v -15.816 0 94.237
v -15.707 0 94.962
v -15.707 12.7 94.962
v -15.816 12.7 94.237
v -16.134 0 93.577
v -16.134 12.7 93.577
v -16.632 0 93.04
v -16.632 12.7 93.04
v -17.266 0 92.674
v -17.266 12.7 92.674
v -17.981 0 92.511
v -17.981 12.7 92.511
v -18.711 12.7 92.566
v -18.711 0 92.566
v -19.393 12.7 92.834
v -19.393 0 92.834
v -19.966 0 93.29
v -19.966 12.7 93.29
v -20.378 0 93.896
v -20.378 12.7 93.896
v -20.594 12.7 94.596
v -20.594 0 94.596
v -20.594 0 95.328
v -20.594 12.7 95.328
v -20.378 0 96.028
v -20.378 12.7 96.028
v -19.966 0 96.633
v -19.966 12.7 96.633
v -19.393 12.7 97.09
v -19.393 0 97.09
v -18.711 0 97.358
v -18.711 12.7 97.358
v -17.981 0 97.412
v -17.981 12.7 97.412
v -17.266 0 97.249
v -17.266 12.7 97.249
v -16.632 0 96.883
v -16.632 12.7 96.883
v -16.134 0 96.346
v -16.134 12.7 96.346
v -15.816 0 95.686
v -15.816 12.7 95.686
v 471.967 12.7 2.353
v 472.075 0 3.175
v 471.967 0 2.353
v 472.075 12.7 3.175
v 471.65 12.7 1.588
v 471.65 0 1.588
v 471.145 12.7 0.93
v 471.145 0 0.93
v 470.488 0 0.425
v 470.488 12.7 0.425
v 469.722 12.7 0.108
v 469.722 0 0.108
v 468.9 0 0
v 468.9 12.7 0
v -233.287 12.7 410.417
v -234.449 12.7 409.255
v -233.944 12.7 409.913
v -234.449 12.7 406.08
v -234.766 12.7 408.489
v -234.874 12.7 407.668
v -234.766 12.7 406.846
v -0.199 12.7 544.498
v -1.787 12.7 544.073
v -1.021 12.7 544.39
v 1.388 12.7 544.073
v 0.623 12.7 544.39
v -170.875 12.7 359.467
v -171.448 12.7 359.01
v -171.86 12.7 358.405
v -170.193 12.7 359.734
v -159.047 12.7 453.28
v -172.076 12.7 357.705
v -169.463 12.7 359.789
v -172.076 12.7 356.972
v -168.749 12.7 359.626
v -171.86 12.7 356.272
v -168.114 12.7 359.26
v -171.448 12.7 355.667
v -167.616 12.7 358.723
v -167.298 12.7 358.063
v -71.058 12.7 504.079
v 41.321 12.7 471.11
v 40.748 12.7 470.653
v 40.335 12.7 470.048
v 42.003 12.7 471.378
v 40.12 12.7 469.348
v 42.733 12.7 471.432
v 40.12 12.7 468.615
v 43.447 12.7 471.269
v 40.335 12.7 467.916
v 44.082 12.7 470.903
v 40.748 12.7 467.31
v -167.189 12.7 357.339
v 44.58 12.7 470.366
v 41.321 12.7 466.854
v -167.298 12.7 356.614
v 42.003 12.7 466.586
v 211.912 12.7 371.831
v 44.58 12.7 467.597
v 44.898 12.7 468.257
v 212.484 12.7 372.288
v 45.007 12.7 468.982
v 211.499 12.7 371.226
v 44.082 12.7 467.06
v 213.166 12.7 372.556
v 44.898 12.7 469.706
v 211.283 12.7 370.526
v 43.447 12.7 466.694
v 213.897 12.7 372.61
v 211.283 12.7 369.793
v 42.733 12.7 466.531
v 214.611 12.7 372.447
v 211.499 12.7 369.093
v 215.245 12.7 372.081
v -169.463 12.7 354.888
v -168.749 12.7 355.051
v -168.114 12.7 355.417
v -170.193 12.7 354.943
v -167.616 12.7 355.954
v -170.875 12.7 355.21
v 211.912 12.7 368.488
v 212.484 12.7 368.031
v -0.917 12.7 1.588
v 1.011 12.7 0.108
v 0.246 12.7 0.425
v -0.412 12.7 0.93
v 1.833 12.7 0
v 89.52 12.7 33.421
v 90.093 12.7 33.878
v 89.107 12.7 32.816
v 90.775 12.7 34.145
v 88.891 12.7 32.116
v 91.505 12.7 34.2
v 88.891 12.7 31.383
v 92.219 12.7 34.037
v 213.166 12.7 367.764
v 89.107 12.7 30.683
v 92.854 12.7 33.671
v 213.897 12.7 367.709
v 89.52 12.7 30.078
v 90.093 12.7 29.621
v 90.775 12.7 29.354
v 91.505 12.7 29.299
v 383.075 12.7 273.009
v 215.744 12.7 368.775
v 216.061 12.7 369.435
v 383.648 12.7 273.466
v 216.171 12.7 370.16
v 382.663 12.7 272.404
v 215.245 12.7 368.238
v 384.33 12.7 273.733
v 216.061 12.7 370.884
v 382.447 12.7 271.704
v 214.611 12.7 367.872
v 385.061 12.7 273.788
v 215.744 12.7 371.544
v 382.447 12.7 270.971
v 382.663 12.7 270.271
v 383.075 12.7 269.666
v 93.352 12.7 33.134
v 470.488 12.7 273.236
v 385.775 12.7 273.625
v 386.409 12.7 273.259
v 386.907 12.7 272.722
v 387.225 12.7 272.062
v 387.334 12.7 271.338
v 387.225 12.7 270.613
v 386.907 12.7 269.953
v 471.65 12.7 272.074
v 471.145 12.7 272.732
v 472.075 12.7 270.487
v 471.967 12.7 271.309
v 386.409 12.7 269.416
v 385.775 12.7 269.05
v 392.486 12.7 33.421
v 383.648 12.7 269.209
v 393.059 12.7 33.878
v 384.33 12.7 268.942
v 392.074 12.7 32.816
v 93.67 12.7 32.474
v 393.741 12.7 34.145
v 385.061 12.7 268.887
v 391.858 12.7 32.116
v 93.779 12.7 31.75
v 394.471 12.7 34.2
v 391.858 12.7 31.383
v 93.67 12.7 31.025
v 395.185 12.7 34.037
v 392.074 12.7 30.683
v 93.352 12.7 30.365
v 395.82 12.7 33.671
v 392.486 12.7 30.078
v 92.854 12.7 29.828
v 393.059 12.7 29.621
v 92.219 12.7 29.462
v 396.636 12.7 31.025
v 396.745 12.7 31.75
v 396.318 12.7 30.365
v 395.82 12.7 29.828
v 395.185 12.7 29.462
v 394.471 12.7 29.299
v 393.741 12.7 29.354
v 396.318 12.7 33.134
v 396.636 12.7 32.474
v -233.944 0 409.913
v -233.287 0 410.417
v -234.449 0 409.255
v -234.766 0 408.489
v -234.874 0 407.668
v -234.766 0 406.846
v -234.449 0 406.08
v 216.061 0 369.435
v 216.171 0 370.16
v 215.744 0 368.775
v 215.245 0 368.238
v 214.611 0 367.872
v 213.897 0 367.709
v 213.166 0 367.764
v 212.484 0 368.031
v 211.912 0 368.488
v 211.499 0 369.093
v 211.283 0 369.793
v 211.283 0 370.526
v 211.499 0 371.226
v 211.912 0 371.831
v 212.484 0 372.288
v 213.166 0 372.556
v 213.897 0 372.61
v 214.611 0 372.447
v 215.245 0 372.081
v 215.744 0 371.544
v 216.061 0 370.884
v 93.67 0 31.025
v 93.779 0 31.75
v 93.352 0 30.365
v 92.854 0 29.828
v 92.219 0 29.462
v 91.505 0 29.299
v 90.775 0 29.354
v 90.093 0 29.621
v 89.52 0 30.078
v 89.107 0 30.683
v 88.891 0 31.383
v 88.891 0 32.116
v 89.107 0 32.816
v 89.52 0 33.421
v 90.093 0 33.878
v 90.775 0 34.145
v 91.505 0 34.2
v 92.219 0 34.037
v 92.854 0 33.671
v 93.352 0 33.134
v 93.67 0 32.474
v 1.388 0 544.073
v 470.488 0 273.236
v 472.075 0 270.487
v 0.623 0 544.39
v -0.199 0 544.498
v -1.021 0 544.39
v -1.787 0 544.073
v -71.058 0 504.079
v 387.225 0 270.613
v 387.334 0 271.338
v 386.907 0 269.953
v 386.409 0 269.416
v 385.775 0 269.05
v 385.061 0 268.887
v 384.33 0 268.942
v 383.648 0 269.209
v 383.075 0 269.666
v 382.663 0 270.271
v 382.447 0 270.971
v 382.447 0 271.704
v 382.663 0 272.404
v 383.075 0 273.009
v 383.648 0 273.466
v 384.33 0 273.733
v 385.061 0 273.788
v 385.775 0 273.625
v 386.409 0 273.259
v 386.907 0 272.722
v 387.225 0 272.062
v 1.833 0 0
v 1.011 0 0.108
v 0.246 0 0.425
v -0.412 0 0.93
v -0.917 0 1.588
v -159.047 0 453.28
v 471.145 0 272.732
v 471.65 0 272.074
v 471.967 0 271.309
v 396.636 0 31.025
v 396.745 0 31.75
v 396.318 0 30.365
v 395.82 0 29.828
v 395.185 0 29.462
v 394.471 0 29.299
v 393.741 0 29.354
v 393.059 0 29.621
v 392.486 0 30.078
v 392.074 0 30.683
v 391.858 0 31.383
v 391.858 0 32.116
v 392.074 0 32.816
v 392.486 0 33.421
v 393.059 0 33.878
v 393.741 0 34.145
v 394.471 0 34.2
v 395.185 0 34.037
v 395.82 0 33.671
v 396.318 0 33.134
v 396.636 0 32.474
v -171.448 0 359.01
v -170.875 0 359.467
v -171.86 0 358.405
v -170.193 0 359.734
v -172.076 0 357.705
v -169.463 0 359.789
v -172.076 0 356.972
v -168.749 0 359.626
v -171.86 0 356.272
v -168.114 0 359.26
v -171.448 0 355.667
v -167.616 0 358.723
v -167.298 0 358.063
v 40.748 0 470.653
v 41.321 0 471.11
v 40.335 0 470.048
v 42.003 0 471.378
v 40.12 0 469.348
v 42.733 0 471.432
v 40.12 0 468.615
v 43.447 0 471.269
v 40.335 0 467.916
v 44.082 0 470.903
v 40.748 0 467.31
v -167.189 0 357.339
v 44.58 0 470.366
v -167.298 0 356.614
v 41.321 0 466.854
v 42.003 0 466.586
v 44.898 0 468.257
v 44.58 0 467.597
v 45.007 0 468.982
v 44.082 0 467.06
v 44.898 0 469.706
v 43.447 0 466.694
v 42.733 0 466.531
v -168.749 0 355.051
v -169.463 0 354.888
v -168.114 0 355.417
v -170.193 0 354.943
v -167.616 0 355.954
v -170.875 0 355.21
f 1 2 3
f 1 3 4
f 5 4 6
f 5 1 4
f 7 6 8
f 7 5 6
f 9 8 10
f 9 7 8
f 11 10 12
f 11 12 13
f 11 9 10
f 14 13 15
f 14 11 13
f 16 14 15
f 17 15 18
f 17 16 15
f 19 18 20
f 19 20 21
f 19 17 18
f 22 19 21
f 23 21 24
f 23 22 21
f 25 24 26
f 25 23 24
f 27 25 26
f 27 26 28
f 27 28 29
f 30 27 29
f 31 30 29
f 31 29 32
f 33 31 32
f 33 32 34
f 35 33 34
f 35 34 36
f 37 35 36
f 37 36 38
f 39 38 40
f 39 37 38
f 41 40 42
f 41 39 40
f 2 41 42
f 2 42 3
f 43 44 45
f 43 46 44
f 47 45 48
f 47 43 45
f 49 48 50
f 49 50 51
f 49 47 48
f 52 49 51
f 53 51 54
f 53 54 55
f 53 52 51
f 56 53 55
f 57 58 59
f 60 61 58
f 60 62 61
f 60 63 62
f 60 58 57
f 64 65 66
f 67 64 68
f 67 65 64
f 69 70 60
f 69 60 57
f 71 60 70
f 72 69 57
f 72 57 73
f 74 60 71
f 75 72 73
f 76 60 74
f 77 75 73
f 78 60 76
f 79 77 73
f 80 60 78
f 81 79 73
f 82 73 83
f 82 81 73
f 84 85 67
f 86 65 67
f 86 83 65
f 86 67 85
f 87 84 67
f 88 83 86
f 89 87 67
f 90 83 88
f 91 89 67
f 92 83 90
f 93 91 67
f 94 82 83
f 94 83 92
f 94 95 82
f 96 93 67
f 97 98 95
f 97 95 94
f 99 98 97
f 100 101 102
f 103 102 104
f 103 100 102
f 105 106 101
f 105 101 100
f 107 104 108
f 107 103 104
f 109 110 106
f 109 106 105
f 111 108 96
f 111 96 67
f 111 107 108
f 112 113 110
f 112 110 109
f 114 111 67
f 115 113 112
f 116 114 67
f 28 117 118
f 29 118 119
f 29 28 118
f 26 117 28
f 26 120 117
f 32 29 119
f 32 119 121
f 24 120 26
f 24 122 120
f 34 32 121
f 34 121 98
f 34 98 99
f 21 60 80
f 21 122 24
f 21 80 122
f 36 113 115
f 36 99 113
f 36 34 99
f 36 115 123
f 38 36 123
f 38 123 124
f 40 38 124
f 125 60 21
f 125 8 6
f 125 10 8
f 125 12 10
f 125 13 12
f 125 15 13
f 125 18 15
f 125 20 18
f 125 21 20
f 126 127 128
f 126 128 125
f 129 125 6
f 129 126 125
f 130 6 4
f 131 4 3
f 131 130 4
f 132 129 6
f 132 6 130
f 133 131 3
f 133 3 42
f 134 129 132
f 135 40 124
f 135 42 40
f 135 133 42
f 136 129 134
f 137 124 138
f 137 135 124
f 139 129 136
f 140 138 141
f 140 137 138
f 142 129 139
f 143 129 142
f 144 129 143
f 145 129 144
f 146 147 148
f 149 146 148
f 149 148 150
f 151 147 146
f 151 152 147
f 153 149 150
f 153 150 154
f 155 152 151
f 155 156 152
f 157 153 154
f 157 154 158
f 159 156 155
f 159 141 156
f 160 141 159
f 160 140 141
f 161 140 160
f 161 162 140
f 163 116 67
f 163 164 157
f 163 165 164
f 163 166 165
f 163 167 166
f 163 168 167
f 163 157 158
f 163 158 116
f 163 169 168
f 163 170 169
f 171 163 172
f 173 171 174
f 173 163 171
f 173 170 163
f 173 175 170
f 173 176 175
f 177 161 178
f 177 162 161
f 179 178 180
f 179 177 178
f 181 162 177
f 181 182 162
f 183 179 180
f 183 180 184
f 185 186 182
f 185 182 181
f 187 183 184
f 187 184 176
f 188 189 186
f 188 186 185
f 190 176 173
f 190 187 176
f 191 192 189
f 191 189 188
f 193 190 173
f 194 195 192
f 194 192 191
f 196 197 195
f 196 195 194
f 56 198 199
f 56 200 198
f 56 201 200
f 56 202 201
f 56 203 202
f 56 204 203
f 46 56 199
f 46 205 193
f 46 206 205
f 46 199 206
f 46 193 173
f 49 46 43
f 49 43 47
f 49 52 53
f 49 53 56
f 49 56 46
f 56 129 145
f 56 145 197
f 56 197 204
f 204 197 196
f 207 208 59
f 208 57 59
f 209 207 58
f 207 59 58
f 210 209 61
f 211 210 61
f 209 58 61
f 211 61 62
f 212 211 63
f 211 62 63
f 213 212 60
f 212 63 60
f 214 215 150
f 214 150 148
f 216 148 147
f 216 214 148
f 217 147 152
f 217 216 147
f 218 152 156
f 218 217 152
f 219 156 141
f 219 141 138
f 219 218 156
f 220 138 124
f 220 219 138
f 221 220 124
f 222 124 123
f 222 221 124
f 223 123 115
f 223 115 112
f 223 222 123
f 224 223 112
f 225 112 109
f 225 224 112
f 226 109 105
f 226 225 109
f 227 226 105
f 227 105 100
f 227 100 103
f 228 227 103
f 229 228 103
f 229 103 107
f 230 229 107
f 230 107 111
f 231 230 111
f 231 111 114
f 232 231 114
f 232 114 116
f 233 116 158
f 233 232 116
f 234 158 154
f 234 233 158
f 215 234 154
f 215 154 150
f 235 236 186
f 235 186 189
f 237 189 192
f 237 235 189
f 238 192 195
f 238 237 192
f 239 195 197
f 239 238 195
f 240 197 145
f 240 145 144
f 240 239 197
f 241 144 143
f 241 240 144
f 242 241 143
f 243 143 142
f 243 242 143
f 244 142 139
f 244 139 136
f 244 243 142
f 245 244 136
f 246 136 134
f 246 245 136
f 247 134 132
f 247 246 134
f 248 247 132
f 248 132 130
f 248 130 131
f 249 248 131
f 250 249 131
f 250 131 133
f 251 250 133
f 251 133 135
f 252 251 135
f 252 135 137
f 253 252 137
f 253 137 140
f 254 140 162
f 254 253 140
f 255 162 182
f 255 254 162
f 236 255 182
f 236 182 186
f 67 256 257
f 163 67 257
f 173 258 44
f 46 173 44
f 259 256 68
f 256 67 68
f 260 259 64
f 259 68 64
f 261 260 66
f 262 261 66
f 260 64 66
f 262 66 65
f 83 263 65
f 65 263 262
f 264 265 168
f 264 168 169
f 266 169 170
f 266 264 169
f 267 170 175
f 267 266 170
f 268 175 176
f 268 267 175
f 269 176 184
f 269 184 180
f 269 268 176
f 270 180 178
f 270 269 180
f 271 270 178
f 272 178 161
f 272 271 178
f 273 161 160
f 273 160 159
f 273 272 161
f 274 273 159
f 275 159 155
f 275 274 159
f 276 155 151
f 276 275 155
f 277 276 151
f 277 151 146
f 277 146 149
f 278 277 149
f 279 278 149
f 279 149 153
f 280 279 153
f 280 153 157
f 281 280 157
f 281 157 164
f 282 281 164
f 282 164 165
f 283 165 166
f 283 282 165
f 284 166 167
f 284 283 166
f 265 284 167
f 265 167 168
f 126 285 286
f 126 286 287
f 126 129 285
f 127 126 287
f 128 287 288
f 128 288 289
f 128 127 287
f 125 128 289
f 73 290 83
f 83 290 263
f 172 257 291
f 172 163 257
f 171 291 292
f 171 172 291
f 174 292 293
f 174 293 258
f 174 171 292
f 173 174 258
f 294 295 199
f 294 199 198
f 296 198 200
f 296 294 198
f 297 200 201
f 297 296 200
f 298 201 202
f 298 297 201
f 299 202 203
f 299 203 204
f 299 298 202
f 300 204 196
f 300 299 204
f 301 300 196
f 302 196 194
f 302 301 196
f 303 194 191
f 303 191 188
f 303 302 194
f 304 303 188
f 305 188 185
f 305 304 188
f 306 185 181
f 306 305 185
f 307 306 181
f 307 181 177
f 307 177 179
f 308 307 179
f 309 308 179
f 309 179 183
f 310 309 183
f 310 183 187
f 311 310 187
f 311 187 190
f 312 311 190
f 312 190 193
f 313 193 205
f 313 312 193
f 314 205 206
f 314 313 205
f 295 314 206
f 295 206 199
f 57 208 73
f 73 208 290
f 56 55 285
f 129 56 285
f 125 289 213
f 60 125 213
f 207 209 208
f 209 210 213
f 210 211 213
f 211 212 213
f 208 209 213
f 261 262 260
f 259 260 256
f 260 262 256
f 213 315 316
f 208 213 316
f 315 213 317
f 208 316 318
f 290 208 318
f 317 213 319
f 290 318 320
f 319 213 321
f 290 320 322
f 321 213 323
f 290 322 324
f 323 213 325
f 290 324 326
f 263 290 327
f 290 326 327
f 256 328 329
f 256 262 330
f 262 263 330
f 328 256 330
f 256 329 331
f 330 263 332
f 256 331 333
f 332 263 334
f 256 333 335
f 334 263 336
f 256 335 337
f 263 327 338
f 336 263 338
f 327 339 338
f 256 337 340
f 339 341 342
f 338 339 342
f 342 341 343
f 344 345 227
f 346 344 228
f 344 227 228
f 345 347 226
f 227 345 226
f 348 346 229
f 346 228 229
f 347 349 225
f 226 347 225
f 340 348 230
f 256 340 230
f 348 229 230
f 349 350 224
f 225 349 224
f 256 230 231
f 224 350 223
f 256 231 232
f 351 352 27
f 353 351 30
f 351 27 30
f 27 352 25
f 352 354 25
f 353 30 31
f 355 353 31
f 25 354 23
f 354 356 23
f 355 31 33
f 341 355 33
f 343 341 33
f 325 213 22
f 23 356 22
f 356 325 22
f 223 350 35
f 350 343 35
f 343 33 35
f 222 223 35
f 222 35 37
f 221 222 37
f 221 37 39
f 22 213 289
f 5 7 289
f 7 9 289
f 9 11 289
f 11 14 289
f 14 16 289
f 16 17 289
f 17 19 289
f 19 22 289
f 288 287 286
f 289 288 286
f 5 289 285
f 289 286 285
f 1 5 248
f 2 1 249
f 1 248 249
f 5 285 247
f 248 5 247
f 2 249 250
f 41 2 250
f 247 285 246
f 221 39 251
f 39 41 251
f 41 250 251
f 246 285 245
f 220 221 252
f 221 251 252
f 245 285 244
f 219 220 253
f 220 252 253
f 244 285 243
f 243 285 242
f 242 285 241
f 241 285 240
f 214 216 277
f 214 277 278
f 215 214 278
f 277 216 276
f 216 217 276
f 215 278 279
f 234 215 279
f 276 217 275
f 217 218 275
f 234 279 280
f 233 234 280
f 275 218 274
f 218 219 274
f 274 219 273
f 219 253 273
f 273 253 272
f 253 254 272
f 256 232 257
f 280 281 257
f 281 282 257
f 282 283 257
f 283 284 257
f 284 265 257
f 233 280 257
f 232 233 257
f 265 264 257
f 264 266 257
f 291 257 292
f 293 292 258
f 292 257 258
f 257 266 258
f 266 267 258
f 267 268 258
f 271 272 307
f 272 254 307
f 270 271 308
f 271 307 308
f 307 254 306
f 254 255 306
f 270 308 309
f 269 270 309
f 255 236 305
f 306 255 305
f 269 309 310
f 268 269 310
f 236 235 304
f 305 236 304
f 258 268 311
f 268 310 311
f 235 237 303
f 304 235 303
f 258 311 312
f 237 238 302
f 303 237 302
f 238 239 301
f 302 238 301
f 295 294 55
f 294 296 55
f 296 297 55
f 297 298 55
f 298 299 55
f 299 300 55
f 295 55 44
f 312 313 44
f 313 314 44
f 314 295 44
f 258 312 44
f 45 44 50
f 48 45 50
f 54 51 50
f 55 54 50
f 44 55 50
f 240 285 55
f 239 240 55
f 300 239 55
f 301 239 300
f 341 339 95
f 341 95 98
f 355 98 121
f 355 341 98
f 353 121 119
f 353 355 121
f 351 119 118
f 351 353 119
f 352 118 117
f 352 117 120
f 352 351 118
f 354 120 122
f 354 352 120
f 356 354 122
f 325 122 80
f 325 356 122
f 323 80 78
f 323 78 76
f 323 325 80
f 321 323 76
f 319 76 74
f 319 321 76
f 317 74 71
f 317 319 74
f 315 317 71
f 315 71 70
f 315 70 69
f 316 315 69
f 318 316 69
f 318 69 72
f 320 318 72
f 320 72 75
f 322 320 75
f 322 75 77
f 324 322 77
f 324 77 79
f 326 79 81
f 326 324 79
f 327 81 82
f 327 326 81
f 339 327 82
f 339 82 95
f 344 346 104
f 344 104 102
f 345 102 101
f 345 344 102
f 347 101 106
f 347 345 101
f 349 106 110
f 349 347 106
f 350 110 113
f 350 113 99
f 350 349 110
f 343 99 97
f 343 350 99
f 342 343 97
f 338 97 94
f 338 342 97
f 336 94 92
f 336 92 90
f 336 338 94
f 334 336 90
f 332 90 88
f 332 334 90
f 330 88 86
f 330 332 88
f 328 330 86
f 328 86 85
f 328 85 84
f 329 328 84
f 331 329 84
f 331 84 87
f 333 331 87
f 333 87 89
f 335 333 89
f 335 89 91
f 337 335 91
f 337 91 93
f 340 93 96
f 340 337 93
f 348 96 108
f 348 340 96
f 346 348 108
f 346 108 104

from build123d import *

# Parameters (mm, degrees)
SKETCH1_R           = 2.45745
BOSS_EXTRUDE1_DEPTH = 12.7
FILLET1_R           = 3.175


with BuildPart() as part:
    # Sketch1 → Boss-Extrude1 (new body)
    with BuildSketch(Plane(origin=(0, 0, 0), x_dir=(1, 0, 0), z_dir=(0, 1, 0))):
        Polygon((-0.199185023, -544.98942083), (472.075100704, -272.319932268), (472.075100704, -189.70625), (472.075100704, -89.69375), (472.075100704, 0), (0, 0), (-236.036311861, -408.829744745), (-159.04651881, -453.279511515), (-71.058183894, -504.079244967), align=None)
        with Locations((-169.646411276, -357.338592529)):
            Circle(SKETCH1_R, mode=Mode.SUBTRACT)
        with Locations((-18.164146109, -94.961777227)):
            Circle(SKETCH1_R, mode=Mode.SUBTRACT)
        with Locations((91.321480704, -31.749605568)):
            Circle(SKETCH1_R, mode=Mode.SUBTRACT)
        with Locations((394.287600704, -31.749605568)):
            Circle(SKETCH1_R, mode=Mode.SUBTRACT)
        with Locations((384.876900704, -271.337645568)):
            Circle(SKETCH1_R, mode=Mode.SUBTRACT)
        with Locations((213.713214706, -370.159699049)):
            Circle(SKETCH1_R, mode=Mode.SUBTRACT)
        with Locations((42.549528708, -468.981752529)):
            Circle(SKETCH1_R, mode=Mode.SUBTRACT)
    extrude(amount=BOSS_EXTRUDE1_DEPTH)

    # Fillet1
    fillet1_edges = [part.edges().sort_by_distance(p)[0] for p in [
        (472.075100704, 6.35, 272.319932268),
        (-0.199185023, 6.35, 544.98942083),
        (-236.036311861, 6.35, 408.829744745),
        (0, 6.35, 0),
        (472.075100704, 6.35, 0),
    ]]
    fillet(fillet1_edges, radius=FILLET1_R)


solid = part.part
